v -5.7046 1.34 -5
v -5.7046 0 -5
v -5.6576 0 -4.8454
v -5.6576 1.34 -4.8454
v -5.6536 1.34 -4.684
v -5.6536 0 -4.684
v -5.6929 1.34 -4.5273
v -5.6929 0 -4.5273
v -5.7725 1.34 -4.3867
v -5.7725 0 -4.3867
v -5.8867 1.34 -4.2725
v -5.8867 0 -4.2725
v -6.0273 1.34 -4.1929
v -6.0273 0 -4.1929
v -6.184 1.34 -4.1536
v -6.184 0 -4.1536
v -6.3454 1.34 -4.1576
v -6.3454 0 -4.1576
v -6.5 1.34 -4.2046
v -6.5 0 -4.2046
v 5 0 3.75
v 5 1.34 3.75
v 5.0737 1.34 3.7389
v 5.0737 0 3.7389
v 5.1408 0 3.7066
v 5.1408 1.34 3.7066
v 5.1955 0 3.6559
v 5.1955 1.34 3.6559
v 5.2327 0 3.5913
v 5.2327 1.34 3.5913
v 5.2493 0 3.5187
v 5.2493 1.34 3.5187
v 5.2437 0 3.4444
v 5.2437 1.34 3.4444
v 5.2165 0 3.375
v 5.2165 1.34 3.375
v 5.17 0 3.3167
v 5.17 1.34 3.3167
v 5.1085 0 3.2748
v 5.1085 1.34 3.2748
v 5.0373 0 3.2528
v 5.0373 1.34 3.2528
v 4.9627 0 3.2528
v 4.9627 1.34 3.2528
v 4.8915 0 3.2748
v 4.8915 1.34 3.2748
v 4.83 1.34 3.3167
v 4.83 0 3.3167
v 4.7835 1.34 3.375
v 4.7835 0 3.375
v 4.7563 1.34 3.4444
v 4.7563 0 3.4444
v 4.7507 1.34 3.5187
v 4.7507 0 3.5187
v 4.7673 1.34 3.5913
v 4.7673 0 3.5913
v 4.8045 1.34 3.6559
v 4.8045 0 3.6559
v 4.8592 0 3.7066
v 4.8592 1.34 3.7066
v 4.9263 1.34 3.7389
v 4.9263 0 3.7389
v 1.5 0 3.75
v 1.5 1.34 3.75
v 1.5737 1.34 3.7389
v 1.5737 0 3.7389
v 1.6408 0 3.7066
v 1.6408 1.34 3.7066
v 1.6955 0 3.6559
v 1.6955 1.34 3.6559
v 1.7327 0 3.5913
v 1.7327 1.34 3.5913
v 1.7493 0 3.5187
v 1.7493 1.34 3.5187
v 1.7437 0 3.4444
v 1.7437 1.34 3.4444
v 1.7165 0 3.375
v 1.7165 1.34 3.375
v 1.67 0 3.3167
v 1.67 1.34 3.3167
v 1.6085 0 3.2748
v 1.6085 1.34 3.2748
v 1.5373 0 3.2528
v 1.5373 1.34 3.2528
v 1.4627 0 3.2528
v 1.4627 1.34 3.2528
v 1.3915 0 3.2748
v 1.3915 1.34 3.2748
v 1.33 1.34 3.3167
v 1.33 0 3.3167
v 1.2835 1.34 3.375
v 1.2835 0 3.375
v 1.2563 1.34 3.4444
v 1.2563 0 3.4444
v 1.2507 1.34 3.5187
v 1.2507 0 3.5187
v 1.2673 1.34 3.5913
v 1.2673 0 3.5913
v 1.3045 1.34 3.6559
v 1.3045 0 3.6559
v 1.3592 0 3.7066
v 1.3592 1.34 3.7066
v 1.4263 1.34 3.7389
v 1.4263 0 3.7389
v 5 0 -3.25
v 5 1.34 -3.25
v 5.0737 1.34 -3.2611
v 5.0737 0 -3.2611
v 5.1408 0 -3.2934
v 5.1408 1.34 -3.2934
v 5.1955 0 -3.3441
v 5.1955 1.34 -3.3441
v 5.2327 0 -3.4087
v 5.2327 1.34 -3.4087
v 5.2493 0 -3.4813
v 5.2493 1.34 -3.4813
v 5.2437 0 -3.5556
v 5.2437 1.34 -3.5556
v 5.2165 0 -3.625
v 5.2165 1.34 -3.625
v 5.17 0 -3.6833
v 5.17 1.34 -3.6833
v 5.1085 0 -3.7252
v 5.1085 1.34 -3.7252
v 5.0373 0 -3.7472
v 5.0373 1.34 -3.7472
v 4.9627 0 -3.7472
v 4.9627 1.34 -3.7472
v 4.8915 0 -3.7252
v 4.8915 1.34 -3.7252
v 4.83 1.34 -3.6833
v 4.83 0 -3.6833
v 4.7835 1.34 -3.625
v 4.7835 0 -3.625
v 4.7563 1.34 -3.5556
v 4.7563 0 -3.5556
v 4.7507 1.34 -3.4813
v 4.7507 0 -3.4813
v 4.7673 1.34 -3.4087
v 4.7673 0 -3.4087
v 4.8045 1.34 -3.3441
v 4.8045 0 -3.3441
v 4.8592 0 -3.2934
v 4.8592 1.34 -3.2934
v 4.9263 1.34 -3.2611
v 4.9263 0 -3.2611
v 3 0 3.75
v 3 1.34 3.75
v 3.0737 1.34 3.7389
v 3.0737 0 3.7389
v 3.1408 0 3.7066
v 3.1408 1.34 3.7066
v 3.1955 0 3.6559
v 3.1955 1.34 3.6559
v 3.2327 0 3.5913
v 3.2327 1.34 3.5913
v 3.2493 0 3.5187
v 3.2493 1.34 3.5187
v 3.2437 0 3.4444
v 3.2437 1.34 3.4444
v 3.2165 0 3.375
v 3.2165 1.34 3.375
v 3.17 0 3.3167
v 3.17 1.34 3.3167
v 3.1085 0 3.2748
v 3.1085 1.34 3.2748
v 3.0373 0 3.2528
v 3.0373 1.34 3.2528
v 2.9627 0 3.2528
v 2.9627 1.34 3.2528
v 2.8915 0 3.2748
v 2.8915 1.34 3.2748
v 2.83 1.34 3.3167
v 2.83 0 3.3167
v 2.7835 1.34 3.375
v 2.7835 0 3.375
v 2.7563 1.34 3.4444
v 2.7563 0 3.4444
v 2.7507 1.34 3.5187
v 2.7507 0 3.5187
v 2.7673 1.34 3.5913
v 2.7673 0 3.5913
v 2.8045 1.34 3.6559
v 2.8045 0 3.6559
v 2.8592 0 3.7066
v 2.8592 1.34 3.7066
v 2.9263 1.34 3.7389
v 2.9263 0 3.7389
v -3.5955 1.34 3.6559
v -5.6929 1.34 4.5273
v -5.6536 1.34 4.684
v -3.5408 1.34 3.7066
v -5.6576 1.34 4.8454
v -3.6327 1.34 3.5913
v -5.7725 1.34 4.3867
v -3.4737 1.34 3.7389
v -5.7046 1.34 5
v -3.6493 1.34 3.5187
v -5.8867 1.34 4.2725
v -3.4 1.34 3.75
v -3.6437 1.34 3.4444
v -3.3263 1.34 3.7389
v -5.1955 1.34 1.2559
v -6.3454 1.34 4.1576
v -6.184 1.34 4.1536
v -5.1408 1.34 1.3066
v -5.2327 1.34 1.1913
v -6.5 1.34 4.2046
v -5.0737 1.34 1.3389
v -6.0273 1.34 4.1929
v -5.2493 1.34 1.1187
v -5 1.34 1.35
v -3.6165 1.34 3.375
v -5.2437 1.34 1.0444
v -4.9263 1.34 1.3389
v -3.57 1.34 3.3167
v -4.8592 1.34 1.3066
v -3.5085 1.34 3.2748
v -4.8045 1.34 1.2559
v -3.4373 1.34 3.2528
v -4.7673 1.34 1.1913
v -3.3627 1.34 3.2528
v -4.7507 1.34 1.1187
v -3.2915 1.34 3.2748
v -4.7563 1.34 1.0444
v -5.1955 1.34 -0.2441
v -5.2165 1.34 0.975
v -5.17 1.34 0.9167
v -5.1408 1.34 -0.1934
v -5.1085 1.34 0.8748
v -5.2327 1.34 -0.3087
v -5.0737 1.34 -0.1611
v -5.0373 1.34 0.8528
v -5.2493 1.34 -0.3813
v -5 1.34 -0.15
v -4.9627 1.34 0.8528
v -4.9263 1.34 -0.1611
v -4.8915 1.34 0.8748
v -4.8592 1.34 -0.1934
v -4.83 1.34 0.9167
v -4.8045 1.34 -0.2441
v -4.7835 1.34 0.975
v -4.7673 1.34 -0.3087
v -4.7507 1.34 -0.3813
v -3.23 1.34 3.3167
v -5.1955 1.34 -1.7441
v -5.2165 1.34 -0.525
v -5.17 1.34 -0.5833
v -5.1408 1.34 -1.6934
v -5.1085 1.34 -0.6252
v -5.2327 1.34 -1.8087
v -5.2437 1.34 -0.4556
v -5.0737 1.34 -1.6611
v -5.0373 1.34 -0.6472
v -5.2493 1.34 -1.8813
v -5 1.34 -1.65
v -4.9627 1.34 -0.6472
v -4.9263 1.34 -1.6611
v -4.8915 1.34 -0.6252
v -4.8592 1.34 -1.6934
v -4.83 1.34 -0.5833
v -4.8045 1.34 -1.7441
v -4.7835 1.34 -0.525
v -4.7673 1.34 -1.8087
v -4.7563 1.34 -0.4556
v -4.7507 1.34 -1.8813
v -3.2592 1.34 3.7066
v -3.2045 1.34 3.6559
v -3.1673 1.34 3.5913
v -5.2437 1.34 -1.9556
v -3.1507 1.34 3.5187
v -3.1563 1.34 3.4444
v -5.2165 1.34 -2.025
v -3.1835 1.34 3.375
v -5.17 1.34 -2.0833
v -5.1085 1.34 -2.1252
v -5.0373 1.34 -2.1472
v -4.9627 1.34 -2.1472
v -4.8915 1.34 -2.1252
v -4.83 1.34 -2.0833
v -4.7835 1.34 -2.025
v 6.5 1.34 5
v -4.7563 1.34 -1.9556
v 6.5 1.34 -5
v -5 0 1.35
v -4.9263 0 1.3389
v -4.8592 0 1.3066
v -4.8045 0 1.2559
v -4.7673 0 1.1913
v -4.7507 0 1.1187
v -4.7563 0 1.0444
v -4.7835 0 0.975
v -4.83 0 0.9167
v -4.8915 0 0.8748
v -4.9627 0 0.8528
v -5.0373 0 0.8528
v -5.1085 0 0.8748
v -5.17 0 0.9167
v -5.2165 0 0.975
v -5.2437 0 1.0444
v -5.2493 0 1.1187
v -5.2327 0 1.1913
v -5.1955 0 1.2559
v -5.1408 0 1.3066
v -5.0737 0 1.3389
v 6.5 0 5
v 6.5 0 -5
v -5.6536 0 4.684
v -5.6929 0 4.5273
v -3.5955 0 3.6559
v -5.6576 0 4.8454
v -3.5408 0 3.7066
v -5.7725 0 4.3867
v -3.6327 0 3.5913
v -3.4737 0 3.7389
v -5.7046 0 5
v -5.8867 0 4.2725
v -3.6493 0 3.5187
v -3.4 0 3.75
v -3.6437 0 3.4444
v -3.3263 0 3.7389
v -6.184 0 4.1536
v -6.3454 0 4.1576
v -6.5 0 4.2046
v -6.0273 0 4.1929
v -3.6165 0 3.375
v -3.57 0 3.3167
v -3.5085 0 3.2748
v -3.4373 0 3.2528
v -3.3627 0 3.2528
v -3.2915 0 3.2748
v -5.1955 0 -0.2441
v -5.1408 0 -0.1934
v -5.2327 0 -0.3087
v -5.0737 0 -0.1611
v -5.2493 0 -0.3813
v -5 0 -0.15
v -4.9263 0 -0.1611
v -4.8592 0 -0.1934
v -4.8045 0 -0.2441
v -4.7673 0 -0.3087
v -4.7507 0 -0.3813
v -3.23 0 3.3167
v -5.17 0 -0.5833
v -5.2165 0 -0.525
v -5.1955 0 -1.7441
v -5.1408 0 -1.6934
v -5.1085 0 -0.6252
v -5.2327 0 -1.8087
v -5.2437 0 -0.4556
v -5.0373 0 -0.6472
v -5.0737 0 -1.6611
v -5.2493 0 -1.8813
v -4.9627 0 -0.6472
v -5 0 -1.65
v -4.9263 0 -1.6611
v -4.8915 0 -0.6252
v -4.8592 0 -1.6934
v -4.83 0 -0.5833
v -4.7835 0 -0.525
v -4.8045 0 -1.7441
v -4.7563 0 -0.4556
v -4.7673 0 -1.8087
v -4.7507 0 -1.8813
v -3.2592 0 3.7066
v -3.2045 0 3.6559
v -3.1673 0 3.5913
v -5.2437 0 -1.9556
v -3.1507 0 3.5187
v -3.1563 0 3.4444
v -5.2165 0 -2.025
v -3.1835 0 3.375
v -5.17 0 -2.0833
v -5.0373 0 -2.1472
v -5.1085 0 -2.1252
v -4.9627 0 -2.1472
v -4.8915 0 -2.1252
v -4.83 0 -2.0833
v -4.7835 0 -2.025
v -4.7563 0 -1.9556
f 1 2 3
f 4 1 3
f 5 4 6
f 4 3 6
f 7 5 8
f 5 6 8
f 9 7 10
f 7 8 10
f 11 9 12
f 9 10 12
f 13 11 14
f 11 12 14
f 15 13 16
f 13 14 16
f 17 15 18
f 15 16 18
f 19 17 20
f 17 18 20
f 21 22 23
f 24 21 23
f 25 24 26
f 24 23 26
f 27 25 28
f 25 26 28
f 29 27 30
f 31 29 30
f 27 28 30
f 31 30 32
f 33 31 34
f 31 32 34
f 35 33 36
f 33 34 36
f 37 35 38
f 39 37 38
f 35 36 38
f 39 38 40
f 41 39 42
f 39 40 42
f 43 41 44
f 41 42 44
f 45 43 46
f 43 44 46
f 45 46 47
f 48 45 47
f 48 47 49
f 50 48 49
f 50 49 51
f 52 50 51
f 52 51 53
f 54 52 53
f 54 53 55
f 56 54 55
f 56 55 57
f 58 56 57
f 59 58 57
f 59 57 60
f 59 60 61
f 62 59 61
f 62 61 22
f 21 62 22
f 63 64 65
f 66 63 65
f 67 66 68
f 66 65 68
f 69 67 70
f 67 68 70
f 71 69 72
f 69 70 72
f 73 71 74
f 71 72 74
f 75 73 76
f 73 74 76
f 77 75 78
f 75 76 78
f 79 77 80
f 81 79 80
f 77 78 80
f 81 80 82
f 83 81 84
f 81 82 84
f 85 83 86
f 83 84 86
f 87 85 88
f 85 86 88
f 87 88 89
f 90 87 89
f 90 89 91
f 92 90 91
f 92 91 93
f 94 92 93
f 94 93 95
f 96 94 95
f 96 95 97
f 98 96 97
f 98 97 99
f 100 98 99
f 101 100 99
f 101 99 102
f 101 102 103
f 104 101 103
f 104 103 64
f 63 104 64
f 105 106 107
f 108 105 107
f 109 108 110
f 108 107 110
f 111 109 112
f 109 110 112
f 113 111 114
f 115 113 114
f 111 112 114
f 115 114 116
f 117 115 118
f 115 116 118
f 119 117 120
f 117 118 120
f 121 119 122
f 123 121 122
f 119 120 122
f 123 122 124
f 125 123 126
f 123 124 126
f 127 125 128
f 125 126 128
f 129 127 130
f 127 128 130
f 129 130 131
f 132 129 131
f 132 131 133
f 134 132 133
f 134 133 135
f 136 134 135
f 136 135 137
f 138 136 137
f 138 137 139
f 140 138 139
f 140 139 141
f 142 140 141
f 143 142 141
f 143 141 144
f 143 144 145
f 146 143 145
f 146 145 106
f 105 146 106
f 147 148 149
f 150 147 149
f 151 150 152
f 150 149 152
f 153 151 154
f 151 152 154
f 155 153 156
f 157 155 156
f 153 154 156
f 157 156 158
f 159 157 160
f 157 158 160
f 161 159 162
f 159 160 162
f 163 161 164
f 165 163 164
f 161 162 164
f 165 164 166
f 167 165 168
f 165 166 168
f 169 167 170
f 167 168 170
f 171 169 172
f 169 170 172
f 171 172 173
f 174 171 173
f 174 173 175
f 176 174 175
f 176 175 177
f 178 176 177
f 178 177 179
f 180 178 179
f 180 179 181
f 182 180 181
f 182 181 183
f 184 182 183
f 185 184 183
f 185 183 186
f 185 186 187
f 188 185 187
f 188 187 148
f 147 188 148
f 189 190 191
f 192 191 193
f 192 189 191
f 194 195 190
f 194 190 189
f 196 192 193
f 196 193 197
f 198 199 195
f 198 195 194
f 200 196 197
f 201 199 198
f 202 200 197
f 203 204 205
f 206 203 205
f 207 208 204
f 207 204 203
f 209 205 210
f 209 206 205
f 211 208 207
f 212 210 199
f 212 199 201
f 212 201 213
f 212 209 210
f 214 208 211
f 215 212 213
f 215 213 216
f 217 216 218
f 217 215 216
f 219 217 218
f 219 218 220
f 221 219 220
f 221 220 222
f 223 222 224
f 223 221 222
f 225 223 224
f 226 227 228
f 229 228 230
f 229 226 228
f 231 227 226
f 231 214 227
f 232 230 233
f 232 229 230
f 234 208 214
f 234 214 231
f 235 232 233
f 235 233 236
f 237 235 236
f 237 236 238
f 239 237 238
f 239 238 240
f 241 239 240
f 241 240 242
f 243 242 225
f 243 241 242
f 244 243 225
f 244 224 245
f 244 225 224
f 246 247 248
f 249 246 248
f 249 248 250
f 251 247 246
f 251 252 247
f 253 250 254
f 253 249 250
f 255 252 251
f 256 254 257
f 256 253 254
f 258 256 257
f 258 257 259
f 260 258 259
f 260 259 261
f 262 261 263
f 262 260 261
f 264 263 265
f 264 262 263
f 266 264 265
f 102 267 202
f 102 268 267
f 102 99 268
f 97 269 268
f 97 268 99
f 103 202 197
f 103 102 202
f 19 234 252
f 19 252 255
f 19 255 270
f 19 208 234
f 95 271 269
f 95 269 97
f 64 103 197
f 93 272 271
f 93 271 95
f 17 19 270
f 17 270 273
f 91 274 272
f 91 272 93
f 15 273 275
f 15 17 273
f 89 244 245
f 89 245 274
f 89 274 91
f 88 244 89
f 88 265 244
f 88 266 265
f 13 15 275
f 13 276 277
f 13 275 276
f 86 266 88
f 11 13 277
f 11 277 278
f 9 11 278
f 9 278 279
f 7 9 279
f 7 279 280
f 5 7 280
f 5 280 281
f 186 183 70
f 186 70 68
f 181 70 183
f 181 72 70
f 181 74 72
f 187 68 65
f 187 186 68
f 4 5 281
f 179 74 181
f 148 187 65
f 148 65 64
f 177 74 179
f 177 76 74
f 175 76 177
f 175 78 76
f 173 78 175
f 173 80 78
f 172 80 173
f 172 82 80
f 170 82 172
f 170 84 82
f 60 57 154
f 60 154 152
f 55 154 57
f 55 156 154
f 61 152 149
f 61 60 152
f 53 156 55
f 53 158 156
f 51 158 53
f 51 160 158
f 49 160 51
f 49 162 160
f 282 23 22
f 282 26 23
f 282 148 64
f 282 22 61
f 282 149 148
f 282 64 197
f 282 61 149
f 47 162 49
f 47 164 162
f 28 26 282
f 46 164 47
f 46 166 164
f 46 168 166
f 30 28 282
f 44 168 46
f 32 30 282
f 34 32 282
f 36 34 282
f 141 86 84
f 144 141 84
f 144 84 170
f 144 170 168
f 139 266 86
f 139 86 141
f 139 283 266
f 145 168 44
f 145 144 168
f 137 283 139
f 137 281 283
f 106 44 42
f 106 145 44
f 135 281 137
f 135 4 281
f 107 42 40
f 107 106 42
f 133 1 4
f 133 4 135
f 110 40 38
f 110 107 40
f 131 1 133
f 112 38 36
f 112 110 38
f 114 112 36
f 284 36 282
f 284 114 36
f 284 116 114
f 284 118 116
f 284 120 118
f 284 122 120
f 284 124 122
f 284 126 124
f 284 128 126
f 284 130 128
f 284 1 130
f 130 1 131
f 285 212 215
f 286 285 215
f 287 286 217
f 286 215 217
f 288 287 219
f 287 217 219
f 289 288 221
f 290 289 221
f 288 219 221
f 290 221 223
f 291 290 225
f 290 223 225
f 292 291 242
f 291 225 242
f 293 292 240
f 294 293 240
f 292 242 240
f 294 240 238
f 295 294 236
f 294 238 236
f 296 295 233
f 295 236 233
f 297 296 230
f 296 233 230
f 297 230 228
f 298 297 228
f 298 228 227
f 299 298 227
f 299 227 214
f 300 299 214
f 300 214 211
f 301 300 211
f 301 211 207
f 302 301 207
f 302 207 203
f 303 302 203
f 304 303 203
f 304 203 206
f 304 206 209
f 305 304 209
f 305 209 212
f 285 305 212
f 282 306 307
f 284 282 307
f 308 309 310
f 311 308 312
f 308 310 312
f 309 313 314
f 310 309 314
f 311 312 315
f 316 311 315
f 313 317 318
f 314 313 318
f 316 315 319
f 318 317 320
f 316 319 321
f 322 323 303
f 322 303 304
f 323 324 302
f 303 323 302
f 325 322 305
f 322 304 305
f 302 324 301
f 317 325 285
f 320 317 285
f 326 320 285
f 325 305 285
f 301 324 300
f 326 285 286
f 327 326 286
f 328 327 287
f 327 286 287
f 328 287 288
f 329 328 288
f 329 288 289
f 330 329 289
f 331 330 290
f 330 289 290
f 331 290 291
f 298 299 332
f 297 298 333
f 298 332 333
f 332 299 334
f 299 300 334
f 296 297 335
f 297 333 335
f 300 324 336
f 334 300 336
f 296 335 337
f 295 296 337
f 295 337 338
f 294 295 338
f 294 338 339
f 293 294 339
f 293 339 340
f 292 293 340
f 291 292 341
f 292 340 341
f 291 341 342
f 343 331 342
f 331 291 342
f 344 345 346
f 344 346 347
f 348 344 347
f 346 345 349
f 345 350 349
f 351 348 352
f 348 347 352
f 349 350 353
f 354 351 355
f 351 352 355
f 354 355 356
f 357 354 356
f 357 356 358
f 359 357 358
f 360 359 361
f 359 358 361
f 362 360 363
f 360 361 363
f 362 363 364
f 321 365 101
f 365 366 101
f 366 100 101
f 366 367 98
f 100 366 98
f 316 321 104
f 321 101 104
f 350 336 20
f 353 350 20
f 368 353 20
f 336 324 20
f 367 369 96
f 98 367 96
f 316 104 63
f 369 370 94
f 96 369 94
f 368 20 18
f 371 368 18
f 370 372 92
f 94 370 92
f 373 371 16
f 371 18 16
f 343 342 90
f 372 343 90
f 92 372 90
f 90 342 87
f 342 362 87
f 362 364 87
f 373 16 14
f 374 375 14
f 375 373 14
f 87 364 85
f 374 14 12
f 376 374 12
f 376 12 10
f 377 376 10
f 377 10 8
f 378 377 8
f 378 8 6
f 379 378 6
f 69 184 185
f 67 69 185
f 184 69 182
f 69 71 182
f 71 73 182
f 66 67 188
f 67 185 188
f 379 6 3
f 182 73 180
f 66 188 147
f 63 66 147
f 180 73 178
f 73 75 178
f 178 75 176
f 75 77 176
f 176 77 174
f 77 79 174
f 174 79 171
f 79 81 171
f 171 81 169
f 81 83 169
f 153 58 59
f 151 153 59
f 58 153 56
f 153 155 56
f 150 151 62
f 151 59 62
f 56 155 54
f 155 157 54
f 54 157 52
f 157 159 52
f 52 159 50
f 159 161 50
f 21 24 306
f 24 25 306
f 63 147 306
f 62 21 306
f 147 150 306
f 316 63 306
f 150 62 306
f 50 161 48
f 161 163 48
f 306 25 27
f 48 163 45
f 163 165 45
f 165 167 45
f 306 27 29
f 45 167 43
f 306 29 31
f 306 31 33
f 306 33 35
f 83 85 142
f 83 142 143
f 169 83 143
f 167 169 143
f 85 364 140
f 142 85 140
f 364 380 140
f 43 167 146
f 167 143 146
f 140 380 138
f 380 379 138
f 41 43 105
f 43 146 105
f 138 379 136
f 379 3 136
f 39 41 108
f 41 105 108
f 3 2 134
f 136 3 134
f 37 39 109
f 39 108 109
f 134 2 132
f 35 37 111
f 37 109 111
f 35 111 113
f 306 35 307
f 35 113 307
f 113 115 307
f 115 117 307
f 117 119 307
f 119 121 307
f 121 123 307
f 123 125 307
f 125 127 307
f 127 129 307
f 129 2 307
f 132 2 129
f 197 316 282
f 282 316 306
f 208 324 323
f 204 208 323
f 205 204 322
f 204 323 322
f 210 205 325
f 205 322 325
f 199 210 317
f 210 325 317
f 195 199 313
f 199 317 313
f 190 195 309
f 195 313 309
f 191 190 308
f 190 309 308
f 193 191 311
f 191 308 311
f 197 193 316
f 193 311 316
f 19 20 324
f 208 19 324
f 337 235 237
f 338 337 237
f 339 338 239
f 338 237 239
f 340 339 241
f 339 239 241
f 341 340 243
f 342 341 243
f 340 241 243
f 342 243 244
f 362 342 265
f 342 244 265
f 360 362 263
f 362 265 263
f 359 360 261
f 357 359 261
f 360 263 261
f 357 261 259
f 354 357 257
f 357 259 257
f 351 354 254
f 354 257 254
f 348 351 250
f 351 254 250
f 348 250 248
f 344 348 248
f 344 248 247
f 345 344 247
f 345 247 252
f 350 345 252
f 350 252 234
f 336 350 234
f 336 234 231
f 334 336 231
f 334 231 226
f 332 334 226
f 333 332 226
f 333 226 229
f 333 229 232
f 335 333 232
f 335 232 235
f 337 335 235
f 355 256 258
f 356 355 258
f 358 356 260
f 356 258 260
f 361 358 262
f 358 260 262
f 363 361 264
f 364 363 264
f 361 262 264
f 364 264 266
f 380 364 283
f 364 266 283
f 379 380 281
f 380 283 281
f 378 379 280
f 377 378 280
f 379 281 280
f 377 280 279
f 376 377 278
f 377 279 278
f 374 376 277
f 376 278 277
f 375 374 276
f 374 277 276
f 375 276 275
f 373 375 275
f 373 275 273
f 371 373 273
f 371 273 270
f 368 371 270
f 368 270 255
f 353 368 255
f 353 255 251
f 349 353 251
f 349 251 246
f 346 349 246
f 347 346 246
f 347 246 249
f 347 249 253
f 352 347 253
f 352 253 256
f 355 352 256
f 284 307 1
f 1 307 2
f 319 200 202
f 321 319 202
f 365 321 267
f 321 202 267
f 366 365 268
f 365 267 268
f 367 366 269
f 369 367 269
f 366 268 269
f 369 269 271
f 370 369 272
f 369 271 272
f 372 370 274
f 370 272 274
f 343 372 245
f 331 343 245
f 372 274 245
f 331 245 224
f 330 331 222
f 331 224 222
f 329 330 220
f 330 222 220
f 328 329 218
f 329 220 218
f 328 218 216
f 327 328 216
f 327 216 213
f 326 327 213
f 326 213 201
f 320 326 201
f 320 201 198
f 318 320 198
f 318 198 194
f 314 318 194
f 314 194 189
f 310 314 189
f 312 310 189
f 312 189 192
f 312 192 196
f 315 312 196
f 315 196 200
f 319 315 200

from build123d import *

# Parameters (mm, degrees)
BOSS_EXTRUDE1_DEPTH = 1.34
SKETCH2_R           = 0.25
CUT_EXTRUDE1_DEPTH  = 9.309368207


with BuildPart() as part:
    # Sketch1 → Boss-Extrude1 (new body)
    with BuildSketch(Plane(origin=(0, 0, 0), x_dir=(1, 0, 0), z_dir=(0, 1, 0))):
        with BuildLine():
            ThreePointArc((-5.704564394, 5), (-5.825735931, 4.325735931), (-6.5, 4.204564394))
            Line((-6.5, 4.204564394), (-6.5, -4.204564394))
            ThreePointArc((-6.5, -4.204564394), (-5.825735931, -4.325735931), (-5.704564394, -5))
            Line((-5.704564394, -5), (6.5, -5))
            Line((6.5, -5), (6.5, 5))
            Line((6.5, 5), (-5.704564394, 5))
        make_face()
    extrude(amount=BOSS_EXTRUDE1_DEPTH)

    # Sketch2 → Cut-Extrude1 (cut, through all)
    with BuildSketch(Plane(origin=(0, 1.34, 0), x_dir=(1, 0, 0), z_dir=(0, 1, 0))):
        with Locations(Location((-5, 1.9, 0), (0, 0, 270))):
            Circle(SKETCH2_R)
        with Locations(Location((-5, 0.4, 0), (0, 0, 270))):
            Circle(SKETCH2_R)
        with Locations(Location((-5, -1.1, 0), (0, 0, 270))):
            Circle(SKETCH2_R)
        with Locations(Location((5, 3.5, 0), (0, 0, 270))):
            Circle(SKETCH2_R)
        with Locations(Location((5, -3.5, 0), (0, 0, 270))):
            Circle(SKETCH2_R)
        with Locations(Location((3, -3.5, 0), (0, 0, 270))):
            Circle(SKETCH2_R)
        with Locations(Location((1.5, -3.5, 0), (0, 0, 270))):
            Circle(SKETCH2_R)
        with Locations(Location((-3.4, -3.5, 0), (0, 0, 270))):
            Circle(SKETCH2_R)
    extrude(amount=-CUT_EXTRUDE1_DEPTH, mode=Mode.SUBTRACT)


solid = part.part
